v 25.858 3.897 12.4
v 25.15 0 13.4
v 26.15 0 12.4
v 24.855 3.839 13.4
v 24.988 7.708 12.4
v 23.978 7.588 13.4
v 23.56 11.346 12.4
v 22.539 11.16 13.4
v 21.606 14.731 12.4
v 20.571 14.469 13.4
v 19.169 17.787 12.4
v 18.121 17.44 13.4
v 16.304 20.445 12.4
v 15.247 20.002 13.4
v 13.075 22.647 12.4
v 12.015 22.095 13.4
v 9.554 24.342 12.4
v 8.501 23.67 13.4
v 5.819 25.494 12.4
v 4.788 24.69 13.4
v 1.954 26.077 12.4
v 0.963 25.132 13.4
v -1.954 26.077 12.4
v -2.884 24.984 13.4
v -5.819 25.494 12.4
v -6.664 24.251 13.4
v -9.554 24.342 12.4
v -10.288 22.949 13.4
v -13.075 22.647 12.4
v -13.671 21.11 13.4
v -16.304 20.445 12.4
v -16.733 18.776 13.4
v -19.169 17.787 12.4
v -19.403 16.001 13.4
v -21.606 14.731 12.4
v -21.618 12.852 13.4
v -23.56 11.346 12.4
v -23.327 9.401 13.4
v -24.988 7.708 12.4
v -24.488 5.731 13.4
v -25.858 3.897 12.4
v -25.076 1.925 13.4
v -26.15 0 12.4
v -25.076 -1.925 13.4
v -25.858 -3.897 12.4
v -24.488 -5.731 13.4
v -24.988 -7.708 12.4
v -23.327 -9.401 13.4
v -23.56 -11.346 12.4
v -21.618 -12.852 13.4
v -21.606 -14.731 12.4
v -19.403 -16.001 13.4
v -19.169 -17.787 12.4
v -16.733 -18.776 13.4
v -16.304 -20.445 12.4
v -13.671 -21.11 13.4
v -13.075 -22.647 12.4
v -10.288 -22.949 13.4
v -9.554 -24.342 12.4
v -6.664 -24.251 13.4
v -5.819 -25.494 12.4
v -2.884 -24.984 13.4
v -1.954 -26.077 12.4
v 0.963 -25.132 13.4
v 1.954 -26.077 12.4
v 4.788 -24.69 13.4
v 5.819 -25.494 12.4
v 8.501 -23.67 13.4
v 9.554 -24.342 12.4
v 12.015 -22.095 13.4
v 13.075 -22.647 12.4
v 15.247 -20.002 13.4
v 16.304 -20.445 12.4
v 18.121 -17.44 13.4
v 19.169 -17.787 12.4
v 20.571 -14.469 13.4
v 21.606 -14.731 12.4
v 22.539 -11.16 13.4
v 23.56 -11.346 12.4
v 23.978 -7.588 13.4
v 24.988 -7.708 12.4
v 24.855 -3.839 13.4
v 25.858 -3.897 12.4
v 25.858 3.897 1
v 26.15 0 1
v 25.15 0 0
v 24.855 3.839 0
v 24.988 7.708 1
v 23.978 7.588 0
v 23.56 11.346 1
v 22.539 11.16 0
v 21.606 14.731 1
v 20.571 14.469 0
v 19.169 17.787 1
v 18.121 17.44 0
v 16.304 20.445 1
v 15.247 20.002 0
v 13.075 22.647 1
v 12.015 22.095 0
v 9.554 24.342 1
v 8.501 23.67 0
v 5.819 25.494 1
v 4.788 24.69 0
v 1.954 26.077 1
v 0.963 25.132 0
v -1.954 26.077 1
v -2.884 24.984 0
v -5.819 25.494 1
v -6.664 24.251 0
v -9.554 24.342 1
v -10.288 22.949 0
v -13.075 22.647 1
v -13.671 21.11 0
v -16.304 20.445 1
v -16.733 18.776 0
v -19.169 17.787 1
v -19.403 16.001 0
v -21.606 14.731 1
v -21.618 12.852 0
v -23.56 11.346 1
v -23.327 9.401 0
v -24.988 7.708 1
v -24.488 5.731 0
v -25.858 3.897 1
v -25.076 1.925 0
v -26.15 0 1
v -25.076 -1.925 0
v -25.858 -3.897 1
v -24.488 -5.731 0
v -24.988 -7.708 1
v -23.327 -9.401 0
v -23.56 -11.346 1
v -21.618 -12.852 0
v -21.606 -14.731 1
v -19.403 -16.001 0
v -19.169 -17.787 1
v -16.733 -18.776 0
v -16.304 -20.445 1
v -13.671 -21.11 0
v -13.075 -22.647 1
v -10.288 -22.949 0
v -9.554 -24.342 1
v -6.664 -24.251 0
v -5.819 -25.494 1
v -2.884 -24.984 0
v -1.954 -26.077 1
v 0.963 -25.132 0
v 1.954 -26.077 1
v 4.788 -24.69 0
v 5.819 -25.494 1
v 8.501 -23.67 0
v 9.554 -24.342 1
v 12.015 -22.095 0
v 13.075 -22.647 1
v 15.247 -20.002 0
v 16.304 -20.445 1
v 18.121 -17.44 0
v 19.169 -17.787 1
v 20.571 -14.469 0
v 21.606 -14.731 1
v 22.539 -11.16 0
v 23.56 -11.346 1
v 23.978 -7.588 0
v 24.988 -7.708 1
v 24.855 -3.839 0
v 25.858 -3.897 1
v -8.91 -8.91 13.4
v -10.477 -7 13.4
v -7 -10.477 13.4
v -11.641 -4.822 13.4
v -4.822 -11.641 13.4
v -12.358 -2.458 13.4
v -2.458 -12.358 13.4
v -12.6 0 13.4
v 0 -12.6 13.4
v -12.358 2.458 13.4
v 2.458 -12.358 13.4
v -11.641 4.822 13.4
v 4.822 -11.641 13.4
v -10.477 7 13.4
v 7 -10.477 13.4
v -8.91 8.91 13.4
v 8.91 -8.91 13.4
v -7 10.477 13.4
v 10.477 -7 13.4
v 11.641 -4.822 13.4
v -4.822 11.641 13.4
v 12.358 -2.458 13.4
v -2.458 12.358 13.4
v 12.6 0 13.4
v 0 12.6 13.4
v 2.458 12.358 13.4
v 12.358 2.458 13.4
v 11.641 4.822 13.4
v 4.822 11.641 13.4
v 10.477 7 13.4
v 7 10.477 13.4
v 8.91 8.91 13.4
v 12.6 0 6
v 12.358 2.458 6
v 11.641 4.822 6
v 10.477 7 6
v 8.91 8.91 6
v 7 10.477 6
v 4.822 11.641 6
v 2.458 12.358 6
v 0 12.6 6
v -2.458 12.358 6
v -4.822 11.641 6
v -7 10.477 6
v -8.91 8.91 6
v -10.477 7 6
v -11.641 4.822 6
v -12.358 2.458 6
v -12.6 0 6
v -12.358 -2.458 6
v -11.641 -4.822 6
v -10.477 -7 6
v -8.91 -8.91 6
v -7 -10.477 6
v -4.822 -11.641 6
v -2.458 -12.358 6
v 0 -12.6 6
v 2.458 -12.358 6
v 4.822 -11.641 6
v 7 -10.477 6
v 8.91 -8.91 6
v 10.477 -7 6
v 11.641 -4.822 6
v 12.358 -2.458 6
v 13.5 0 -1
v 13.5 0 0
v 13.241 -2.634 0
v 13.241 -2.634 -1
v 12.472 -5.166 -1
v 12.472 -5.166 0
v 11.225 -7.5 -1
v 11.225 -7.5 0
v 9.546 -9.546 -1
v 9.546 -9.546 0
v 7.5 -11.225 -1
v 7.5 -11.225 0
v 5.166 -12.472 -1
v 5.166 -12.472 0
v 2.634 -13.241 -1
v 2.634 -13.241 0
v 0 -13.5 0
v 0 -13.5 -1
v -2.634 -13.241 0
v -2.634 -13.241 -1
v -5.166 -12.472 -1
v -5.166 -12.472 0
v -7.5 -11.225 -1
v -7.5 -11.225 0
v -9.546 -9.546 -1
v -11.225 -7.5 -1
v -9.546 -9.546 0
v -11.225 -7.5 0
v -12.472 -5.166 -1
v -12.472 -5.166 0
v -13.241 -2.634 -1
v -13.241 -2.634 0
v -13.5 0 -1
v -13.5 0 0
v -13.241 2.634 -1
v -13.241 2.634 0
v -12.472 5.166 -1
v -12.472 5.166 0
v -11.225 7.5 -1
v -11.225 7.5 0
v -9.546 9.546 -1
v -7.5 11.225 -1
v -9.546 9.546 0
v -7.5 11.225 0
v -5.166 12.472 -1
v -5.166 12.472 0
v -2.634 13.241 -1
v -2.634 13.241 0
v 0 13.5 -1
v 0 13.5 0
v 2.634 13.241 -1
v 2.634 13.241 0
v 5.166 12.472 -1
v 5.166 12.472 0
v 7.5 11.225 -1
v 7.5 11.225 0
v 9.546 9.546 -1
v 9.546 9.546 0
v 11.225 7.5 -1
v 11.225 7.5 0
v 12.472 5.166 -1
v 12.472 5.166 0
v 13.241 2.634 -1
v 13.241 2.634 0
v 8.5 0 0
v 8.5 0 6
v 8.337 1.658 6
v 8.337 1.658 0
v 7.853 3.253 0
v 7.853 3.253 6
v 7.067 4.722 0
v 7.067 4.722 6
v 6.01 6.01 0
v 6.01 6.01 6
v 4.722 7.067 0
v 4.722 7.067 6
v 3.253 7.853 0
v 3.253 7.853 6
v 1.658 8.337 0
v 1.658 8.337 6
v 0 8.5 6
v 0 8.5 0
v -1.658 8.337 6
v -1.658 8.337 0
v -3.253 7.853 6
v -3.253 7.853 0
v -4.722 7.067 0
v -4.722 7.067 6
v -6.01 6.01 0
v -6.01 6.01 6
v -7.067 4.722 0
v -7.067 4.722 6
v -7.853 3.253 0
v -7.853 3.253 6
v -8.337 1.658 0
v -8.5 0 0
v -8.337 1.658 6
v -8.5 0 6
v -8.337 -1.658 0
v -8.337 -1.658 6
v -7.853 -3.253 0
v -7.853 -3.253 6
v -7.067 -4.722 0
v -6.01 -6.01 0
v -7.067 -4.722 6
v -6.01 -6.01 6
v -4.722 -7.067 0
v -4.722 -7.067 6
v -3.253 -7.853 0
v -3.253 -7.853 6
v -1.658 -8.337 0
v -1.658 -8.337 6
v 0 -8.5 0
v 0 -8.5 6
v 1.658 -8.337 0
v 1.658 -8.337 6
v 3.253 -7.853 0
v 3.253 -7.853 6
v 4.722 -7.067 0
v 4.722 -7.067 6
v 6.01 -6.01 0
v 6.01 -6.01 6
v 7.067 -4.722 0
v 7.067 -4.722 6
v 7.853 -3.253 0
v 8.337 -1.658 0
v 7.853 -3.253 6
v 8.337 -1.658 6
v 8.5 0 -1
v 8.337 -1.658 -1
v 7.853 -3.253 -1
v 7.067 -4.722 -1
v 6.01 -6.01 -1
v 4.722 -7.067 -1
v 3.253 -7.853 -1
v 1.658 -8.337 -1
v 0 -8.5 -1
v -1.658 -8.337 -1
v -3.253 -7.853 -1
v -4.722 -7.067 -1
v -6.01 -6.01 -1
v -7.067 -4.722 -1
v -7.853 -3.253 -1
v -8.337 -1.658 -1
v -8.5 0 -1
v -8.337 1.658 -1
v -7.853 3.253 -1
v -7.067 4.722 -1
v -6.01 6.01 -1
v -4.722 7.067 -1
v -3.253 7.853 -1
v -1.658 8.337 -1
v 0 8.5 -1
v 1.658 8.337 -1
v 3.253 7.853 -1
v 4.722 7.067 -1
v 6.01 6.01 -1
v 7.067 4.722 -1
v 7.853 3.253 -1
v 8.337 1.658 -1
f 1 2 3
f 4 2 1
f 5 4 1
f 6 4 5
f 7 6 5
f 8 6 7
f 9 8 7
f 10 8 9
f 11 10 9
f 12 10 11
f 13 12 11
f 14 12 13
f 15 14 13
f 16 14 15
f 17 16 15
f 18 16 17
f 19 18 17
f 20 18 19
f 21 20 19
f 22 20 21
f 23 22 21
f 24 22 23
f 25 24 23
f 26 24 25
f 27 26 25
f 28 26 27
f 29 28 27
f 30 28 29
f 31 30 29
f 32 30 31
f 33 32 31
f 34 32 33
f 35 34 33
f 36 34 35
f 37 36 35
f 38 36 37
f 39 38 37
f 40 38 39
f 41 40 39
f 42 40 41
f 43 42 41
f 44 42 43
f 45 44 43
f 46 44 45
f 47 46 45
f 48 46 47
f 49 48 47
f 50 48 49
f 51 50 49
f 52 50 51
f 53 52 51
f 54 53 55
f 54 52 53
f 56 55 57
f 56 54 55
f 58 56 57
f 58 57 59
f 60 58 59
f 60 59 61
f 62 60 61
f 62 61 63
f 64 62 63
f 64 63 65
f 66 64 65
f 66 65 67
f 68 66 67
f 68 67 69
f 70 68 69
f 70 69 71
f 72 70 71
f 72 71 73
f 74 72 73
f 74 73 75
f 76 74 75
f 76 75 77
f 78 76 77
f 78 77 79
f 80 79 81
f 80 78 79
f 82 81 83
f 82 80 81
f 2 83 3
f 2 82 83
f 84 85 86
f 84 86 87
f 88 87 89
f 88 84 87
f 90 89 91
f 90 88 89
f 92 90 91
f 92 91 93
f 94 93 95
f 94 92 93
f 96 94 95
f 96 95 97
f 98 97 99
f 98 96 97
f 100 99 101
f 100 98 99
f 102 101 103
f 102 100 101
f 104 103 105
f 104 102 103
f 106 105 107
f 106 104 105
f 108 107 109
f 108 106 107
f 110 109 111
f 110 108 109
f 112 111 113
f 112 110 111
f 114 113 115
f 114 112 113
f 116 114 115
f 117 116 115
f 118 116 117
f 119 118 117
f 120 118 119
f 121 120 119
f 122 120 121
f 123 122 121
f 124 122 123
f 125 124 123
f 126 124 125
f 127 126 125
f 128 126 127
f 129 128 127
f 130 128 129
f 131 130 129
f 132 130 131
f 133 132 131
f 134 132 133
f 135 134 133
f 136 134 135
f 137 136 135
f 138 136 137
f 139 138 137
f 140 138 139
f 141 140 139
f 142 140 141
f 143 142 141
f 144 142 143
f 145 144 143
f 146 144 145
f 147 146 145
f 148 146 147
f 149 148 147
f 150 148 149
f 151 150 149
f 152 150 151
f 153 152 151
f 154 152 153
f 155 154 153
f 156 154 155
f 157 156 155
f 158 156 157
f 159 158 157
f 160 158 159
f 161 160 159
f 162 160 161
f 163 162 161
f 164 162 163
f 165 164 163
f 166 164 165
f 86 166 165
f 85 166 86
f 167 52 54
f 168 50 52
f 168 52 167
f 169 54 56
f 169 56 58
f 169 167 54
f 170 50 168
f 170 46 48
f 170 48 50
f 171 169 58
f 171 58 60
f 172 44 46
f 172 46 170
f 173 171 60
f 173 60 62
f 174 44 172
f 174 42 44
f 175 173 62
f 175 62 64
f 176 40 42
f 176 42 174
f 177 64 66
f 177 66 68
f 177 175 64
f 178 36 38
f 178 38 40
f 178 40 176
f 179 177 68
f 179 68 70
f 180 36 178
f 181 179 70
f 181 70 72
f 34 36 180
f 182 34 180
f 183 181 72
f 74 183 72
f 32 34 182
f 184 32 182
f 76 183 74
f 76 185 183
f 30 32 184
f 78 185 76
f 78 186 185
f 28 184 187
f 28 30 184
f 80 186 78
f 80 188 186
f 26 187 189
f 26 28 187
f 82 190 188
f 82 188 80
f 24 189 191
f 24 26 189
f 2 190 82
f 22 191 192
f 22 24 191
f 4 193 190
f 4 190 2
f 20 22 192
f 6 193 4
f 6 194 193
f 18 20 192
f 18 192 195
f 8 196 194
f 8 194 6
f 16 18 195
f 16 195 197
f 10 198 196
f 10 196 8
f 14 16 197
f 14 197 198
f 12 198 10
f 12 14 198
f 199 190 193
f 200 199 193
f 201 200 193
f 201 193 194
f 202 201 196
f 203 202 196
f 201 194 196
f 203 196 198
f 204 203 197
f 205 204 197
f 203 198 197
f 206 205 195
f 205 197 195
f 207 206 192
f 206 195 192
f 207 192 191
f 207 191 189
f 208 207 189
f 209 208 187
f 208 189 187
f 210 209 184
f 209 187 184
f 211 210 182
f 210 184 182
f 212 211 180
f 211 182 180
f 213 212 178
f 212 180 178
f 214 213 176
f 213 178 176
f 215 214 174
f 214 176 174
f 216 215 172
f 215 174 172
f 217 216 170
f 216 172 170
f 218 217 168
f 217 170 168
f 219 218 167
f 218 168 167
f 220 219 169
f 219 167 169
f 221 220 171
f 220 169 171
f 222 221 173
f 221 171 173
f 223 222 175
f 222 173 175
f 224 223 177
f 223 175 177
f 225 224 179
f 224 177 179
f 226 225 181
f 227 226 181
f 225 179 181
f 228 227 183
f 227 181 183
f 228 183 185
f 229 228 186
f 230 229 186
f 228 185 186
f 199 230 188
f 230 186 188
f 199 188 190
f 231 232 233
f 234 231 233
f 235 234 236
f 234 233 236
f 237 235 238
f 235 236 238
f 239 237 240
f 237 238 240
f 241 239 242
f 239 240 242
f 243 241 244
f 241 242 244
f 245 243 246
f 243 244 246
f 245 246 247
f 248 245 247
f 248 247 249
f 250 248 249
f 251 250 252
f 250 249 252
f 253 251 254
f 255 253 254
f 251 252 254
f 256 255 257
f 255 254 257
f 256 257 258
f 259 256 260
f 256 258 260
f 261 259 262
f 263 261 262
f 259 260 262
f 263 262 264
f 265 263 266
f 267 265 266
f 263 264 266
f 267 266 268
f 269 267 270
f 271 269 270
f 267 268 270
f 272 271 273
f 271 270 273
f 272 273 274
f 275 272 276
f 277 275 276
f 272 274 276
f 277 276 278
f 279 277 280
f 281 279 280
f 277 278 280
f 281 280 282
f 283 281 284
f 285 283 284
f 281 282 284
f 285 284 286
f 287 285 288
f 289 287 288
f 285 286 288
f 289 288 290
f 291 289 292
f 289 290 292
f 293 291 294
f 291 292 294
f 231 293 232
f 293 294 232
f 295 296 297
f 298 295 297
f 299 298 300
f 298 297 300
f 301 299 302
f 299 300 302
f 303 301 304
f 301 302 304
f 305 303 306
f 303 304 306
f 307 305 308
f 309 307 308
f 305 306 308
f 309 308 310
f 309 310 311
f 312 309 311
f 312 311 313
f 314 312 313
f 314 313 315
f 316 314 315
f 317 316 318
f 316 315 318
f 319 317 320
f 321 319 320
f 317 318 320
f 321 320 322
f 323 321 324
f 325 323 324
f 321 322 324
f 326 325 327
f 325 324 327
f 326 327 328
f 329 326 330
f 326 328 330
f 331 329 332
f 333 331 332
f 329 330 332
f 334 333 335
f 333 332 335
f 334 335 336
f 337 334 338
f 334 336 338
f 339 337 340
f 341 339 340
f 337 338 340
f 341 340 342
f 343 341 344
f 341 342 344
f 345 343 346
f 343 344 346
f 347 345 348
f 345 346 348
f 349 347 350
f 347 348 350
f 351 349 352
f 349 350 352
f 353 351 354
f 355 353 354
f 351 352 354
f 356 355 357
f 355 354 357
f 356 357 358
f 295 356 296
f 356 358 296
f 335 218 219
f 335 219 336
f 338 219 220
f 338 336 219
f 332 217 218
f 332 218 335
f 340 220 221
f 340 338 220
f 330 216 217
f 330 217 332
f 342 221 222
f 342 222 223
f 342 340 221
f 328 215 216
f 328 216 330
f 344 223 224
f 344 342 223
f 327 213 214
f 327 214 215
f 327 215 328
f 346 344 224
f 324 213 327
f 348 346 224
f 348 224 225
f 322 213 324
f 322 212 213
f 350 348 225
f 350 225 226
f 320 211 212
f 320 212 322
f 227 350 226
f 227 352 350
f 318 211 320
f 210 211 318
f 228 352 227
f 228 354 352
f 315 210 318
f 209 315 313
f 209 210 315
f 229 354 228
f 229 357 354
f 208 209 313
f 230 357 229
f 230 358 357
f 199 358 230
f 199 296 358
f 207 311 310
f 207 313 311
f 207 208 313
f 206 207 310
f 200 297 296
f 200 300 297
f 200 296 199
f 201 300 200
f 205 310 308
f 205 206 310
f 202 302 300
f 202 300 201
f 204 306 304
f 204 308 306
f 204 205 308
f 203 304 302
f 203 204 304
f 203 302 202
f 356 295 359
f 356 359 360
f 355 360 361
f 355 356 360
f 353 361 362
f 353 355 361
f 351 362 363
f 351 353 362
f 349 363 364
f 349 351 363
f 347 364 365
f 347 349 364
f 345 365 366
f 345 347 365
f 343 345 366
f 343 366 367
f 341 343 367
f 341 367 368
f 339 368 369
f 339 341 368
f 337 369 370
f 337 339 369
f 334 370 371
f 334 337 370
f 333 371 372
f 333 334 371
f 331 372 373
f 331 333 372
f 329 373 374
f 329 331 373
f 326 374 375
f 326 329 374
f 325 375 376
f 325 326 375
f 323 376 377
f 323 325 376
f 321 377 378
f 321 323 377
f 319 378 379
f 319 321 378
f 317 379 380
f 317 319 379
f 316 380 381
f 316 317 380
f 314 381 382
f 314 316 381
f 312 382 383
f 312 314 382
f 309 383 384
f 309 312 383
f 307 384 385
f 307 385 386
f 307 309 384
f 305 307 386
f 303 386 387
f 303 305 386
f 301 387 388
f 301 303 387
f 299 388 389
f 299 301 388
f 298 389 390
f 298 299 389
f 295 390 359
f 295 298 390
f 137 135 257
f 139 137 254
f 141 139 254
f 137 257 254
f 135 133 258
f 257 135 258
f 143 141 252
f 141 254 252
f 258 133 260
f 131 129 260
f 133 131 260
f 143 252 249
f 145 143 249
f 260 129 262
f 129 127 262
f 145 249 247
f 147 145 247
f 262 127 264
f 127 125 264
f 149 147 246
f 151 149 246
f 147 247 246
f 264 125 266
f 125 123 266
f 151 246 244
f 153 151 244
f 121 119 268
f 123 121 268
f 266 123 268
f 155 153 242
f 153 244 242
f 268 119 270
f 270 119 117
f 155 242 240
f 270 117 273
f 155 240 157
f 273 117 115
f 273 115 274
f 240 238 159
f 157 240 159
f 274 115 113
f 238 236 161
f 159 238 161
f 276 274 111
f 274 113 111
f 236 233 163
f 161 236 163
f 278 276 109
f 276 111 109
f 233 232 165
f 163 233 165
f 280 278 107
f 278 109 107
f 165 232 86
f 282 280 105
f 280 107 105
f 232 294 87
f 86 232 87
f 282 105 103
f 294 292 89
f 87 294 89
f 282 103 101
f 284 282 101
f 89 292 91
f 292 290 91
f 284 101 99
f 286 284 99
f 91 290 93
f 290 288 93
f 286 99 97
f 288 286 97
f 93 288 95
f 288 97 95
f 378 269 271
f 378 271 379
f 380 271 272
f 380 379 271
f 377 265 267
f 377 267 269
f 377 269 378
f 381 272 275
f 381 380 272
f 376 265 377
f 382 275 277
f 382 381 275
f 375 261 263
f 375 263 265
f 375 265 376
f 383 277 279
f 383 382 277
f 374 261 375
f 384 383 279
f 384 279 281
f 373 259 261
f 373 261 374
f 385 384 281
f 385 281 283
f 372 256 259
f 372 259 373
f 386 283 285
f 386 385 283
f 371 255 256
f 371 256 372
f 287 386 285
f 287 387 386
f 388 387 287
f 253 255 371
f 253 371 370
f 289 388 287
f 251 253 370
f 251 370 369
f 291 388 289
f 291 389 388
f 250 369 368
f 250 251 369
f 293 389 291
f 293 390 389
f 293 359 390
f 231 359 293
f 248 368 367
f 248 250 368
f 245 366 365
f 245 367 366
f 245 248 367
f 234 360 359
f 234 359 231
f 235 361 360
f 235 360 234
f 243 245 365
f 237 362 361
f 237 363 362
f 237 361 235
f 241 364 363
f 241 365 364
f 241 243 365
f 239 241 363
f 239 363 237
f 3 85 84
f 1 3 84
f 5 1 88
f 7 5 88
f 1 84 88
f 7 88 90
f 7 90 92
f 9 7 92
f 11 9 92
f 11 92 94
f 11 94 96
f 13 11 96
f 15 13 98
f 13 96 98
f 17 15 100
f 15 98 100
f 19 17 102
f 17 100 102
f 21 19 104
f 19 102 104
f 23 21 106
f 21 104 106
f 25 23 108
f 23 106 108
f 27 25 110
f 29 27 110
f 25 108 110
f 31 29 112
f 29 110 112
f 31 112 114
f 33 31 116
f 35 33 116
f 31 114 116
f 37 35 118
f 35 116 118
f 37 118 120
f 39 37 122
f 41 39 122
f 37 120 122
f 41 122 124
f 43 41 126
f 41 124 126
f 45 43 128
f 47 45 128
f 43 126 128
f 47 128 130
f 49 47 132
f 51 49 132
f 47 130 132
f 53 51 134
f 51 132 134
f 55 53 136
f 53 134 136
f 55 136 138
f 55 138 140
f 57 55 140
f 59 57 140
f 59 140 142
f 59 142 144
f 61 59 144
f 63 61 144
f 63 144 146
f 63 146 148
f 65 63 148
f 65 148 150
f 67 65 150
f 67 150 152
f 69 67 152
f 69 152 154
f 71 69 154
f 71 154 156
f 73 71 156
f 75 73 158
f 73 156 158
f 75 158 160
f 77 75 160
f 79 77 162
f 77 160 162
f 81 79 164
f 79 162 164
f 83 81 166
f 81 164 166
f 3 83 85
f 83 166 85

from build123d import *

# Parameters (mm, degrees)
F0_R     = 26.15
F1_DEPTH = 13.4
F2_R     = 12.6
F3_DEPTH = 7.4
F4_R     = 8.5
F5_DEPTH = 6
F6_R     = 13.5
F6_R_2   = 8.5
F7_DEPTH = 1
F8_SIZE  = 1


with BuildPart() as f1:
    # F0 (on Top) → F1 (new body)
    with BuildSketch(Plane.XY):
        Circle(F0_R)
    extrude(amount=F1_DEPTH)

    # F2 (on face) → F3 (cut)
    with BuildSketch(Plane.XY.offset(13.4)):
        Circle(F2_R)
    extrude(amount=-F3_DEPTH, mode=Mode.SUBTRACT)

    # F4 (on face) → F5 (cut, through all)
    with BuildSketch(Plane.XY.offset(6)):
        Circle(F4_R)
    extrude(amount=-F5_DEPTH, mode=Mode.SUBTRACT)

    # F6 (on face) → F7 (join)
    with BuildSketch(Plane(origin=(0, 0, 0), x_dir=(1, 0, 0), z_dir=(0, 0, -1))):
        Circle(F6_R)
        Circle(F6_R_2, mode=Mode.SUBTRACT)
    extrude(amount=F7_DEPTH)

    # F8
    f8_edges = [f1.edges().sort_by_distance(p)[0] for p in [
        (-26.15, 0, 13.4),
        (-26.15, 0, 0),
    ]]
    chamfer(f8_edges, length=F8_SIZE)


solid = f1.part
